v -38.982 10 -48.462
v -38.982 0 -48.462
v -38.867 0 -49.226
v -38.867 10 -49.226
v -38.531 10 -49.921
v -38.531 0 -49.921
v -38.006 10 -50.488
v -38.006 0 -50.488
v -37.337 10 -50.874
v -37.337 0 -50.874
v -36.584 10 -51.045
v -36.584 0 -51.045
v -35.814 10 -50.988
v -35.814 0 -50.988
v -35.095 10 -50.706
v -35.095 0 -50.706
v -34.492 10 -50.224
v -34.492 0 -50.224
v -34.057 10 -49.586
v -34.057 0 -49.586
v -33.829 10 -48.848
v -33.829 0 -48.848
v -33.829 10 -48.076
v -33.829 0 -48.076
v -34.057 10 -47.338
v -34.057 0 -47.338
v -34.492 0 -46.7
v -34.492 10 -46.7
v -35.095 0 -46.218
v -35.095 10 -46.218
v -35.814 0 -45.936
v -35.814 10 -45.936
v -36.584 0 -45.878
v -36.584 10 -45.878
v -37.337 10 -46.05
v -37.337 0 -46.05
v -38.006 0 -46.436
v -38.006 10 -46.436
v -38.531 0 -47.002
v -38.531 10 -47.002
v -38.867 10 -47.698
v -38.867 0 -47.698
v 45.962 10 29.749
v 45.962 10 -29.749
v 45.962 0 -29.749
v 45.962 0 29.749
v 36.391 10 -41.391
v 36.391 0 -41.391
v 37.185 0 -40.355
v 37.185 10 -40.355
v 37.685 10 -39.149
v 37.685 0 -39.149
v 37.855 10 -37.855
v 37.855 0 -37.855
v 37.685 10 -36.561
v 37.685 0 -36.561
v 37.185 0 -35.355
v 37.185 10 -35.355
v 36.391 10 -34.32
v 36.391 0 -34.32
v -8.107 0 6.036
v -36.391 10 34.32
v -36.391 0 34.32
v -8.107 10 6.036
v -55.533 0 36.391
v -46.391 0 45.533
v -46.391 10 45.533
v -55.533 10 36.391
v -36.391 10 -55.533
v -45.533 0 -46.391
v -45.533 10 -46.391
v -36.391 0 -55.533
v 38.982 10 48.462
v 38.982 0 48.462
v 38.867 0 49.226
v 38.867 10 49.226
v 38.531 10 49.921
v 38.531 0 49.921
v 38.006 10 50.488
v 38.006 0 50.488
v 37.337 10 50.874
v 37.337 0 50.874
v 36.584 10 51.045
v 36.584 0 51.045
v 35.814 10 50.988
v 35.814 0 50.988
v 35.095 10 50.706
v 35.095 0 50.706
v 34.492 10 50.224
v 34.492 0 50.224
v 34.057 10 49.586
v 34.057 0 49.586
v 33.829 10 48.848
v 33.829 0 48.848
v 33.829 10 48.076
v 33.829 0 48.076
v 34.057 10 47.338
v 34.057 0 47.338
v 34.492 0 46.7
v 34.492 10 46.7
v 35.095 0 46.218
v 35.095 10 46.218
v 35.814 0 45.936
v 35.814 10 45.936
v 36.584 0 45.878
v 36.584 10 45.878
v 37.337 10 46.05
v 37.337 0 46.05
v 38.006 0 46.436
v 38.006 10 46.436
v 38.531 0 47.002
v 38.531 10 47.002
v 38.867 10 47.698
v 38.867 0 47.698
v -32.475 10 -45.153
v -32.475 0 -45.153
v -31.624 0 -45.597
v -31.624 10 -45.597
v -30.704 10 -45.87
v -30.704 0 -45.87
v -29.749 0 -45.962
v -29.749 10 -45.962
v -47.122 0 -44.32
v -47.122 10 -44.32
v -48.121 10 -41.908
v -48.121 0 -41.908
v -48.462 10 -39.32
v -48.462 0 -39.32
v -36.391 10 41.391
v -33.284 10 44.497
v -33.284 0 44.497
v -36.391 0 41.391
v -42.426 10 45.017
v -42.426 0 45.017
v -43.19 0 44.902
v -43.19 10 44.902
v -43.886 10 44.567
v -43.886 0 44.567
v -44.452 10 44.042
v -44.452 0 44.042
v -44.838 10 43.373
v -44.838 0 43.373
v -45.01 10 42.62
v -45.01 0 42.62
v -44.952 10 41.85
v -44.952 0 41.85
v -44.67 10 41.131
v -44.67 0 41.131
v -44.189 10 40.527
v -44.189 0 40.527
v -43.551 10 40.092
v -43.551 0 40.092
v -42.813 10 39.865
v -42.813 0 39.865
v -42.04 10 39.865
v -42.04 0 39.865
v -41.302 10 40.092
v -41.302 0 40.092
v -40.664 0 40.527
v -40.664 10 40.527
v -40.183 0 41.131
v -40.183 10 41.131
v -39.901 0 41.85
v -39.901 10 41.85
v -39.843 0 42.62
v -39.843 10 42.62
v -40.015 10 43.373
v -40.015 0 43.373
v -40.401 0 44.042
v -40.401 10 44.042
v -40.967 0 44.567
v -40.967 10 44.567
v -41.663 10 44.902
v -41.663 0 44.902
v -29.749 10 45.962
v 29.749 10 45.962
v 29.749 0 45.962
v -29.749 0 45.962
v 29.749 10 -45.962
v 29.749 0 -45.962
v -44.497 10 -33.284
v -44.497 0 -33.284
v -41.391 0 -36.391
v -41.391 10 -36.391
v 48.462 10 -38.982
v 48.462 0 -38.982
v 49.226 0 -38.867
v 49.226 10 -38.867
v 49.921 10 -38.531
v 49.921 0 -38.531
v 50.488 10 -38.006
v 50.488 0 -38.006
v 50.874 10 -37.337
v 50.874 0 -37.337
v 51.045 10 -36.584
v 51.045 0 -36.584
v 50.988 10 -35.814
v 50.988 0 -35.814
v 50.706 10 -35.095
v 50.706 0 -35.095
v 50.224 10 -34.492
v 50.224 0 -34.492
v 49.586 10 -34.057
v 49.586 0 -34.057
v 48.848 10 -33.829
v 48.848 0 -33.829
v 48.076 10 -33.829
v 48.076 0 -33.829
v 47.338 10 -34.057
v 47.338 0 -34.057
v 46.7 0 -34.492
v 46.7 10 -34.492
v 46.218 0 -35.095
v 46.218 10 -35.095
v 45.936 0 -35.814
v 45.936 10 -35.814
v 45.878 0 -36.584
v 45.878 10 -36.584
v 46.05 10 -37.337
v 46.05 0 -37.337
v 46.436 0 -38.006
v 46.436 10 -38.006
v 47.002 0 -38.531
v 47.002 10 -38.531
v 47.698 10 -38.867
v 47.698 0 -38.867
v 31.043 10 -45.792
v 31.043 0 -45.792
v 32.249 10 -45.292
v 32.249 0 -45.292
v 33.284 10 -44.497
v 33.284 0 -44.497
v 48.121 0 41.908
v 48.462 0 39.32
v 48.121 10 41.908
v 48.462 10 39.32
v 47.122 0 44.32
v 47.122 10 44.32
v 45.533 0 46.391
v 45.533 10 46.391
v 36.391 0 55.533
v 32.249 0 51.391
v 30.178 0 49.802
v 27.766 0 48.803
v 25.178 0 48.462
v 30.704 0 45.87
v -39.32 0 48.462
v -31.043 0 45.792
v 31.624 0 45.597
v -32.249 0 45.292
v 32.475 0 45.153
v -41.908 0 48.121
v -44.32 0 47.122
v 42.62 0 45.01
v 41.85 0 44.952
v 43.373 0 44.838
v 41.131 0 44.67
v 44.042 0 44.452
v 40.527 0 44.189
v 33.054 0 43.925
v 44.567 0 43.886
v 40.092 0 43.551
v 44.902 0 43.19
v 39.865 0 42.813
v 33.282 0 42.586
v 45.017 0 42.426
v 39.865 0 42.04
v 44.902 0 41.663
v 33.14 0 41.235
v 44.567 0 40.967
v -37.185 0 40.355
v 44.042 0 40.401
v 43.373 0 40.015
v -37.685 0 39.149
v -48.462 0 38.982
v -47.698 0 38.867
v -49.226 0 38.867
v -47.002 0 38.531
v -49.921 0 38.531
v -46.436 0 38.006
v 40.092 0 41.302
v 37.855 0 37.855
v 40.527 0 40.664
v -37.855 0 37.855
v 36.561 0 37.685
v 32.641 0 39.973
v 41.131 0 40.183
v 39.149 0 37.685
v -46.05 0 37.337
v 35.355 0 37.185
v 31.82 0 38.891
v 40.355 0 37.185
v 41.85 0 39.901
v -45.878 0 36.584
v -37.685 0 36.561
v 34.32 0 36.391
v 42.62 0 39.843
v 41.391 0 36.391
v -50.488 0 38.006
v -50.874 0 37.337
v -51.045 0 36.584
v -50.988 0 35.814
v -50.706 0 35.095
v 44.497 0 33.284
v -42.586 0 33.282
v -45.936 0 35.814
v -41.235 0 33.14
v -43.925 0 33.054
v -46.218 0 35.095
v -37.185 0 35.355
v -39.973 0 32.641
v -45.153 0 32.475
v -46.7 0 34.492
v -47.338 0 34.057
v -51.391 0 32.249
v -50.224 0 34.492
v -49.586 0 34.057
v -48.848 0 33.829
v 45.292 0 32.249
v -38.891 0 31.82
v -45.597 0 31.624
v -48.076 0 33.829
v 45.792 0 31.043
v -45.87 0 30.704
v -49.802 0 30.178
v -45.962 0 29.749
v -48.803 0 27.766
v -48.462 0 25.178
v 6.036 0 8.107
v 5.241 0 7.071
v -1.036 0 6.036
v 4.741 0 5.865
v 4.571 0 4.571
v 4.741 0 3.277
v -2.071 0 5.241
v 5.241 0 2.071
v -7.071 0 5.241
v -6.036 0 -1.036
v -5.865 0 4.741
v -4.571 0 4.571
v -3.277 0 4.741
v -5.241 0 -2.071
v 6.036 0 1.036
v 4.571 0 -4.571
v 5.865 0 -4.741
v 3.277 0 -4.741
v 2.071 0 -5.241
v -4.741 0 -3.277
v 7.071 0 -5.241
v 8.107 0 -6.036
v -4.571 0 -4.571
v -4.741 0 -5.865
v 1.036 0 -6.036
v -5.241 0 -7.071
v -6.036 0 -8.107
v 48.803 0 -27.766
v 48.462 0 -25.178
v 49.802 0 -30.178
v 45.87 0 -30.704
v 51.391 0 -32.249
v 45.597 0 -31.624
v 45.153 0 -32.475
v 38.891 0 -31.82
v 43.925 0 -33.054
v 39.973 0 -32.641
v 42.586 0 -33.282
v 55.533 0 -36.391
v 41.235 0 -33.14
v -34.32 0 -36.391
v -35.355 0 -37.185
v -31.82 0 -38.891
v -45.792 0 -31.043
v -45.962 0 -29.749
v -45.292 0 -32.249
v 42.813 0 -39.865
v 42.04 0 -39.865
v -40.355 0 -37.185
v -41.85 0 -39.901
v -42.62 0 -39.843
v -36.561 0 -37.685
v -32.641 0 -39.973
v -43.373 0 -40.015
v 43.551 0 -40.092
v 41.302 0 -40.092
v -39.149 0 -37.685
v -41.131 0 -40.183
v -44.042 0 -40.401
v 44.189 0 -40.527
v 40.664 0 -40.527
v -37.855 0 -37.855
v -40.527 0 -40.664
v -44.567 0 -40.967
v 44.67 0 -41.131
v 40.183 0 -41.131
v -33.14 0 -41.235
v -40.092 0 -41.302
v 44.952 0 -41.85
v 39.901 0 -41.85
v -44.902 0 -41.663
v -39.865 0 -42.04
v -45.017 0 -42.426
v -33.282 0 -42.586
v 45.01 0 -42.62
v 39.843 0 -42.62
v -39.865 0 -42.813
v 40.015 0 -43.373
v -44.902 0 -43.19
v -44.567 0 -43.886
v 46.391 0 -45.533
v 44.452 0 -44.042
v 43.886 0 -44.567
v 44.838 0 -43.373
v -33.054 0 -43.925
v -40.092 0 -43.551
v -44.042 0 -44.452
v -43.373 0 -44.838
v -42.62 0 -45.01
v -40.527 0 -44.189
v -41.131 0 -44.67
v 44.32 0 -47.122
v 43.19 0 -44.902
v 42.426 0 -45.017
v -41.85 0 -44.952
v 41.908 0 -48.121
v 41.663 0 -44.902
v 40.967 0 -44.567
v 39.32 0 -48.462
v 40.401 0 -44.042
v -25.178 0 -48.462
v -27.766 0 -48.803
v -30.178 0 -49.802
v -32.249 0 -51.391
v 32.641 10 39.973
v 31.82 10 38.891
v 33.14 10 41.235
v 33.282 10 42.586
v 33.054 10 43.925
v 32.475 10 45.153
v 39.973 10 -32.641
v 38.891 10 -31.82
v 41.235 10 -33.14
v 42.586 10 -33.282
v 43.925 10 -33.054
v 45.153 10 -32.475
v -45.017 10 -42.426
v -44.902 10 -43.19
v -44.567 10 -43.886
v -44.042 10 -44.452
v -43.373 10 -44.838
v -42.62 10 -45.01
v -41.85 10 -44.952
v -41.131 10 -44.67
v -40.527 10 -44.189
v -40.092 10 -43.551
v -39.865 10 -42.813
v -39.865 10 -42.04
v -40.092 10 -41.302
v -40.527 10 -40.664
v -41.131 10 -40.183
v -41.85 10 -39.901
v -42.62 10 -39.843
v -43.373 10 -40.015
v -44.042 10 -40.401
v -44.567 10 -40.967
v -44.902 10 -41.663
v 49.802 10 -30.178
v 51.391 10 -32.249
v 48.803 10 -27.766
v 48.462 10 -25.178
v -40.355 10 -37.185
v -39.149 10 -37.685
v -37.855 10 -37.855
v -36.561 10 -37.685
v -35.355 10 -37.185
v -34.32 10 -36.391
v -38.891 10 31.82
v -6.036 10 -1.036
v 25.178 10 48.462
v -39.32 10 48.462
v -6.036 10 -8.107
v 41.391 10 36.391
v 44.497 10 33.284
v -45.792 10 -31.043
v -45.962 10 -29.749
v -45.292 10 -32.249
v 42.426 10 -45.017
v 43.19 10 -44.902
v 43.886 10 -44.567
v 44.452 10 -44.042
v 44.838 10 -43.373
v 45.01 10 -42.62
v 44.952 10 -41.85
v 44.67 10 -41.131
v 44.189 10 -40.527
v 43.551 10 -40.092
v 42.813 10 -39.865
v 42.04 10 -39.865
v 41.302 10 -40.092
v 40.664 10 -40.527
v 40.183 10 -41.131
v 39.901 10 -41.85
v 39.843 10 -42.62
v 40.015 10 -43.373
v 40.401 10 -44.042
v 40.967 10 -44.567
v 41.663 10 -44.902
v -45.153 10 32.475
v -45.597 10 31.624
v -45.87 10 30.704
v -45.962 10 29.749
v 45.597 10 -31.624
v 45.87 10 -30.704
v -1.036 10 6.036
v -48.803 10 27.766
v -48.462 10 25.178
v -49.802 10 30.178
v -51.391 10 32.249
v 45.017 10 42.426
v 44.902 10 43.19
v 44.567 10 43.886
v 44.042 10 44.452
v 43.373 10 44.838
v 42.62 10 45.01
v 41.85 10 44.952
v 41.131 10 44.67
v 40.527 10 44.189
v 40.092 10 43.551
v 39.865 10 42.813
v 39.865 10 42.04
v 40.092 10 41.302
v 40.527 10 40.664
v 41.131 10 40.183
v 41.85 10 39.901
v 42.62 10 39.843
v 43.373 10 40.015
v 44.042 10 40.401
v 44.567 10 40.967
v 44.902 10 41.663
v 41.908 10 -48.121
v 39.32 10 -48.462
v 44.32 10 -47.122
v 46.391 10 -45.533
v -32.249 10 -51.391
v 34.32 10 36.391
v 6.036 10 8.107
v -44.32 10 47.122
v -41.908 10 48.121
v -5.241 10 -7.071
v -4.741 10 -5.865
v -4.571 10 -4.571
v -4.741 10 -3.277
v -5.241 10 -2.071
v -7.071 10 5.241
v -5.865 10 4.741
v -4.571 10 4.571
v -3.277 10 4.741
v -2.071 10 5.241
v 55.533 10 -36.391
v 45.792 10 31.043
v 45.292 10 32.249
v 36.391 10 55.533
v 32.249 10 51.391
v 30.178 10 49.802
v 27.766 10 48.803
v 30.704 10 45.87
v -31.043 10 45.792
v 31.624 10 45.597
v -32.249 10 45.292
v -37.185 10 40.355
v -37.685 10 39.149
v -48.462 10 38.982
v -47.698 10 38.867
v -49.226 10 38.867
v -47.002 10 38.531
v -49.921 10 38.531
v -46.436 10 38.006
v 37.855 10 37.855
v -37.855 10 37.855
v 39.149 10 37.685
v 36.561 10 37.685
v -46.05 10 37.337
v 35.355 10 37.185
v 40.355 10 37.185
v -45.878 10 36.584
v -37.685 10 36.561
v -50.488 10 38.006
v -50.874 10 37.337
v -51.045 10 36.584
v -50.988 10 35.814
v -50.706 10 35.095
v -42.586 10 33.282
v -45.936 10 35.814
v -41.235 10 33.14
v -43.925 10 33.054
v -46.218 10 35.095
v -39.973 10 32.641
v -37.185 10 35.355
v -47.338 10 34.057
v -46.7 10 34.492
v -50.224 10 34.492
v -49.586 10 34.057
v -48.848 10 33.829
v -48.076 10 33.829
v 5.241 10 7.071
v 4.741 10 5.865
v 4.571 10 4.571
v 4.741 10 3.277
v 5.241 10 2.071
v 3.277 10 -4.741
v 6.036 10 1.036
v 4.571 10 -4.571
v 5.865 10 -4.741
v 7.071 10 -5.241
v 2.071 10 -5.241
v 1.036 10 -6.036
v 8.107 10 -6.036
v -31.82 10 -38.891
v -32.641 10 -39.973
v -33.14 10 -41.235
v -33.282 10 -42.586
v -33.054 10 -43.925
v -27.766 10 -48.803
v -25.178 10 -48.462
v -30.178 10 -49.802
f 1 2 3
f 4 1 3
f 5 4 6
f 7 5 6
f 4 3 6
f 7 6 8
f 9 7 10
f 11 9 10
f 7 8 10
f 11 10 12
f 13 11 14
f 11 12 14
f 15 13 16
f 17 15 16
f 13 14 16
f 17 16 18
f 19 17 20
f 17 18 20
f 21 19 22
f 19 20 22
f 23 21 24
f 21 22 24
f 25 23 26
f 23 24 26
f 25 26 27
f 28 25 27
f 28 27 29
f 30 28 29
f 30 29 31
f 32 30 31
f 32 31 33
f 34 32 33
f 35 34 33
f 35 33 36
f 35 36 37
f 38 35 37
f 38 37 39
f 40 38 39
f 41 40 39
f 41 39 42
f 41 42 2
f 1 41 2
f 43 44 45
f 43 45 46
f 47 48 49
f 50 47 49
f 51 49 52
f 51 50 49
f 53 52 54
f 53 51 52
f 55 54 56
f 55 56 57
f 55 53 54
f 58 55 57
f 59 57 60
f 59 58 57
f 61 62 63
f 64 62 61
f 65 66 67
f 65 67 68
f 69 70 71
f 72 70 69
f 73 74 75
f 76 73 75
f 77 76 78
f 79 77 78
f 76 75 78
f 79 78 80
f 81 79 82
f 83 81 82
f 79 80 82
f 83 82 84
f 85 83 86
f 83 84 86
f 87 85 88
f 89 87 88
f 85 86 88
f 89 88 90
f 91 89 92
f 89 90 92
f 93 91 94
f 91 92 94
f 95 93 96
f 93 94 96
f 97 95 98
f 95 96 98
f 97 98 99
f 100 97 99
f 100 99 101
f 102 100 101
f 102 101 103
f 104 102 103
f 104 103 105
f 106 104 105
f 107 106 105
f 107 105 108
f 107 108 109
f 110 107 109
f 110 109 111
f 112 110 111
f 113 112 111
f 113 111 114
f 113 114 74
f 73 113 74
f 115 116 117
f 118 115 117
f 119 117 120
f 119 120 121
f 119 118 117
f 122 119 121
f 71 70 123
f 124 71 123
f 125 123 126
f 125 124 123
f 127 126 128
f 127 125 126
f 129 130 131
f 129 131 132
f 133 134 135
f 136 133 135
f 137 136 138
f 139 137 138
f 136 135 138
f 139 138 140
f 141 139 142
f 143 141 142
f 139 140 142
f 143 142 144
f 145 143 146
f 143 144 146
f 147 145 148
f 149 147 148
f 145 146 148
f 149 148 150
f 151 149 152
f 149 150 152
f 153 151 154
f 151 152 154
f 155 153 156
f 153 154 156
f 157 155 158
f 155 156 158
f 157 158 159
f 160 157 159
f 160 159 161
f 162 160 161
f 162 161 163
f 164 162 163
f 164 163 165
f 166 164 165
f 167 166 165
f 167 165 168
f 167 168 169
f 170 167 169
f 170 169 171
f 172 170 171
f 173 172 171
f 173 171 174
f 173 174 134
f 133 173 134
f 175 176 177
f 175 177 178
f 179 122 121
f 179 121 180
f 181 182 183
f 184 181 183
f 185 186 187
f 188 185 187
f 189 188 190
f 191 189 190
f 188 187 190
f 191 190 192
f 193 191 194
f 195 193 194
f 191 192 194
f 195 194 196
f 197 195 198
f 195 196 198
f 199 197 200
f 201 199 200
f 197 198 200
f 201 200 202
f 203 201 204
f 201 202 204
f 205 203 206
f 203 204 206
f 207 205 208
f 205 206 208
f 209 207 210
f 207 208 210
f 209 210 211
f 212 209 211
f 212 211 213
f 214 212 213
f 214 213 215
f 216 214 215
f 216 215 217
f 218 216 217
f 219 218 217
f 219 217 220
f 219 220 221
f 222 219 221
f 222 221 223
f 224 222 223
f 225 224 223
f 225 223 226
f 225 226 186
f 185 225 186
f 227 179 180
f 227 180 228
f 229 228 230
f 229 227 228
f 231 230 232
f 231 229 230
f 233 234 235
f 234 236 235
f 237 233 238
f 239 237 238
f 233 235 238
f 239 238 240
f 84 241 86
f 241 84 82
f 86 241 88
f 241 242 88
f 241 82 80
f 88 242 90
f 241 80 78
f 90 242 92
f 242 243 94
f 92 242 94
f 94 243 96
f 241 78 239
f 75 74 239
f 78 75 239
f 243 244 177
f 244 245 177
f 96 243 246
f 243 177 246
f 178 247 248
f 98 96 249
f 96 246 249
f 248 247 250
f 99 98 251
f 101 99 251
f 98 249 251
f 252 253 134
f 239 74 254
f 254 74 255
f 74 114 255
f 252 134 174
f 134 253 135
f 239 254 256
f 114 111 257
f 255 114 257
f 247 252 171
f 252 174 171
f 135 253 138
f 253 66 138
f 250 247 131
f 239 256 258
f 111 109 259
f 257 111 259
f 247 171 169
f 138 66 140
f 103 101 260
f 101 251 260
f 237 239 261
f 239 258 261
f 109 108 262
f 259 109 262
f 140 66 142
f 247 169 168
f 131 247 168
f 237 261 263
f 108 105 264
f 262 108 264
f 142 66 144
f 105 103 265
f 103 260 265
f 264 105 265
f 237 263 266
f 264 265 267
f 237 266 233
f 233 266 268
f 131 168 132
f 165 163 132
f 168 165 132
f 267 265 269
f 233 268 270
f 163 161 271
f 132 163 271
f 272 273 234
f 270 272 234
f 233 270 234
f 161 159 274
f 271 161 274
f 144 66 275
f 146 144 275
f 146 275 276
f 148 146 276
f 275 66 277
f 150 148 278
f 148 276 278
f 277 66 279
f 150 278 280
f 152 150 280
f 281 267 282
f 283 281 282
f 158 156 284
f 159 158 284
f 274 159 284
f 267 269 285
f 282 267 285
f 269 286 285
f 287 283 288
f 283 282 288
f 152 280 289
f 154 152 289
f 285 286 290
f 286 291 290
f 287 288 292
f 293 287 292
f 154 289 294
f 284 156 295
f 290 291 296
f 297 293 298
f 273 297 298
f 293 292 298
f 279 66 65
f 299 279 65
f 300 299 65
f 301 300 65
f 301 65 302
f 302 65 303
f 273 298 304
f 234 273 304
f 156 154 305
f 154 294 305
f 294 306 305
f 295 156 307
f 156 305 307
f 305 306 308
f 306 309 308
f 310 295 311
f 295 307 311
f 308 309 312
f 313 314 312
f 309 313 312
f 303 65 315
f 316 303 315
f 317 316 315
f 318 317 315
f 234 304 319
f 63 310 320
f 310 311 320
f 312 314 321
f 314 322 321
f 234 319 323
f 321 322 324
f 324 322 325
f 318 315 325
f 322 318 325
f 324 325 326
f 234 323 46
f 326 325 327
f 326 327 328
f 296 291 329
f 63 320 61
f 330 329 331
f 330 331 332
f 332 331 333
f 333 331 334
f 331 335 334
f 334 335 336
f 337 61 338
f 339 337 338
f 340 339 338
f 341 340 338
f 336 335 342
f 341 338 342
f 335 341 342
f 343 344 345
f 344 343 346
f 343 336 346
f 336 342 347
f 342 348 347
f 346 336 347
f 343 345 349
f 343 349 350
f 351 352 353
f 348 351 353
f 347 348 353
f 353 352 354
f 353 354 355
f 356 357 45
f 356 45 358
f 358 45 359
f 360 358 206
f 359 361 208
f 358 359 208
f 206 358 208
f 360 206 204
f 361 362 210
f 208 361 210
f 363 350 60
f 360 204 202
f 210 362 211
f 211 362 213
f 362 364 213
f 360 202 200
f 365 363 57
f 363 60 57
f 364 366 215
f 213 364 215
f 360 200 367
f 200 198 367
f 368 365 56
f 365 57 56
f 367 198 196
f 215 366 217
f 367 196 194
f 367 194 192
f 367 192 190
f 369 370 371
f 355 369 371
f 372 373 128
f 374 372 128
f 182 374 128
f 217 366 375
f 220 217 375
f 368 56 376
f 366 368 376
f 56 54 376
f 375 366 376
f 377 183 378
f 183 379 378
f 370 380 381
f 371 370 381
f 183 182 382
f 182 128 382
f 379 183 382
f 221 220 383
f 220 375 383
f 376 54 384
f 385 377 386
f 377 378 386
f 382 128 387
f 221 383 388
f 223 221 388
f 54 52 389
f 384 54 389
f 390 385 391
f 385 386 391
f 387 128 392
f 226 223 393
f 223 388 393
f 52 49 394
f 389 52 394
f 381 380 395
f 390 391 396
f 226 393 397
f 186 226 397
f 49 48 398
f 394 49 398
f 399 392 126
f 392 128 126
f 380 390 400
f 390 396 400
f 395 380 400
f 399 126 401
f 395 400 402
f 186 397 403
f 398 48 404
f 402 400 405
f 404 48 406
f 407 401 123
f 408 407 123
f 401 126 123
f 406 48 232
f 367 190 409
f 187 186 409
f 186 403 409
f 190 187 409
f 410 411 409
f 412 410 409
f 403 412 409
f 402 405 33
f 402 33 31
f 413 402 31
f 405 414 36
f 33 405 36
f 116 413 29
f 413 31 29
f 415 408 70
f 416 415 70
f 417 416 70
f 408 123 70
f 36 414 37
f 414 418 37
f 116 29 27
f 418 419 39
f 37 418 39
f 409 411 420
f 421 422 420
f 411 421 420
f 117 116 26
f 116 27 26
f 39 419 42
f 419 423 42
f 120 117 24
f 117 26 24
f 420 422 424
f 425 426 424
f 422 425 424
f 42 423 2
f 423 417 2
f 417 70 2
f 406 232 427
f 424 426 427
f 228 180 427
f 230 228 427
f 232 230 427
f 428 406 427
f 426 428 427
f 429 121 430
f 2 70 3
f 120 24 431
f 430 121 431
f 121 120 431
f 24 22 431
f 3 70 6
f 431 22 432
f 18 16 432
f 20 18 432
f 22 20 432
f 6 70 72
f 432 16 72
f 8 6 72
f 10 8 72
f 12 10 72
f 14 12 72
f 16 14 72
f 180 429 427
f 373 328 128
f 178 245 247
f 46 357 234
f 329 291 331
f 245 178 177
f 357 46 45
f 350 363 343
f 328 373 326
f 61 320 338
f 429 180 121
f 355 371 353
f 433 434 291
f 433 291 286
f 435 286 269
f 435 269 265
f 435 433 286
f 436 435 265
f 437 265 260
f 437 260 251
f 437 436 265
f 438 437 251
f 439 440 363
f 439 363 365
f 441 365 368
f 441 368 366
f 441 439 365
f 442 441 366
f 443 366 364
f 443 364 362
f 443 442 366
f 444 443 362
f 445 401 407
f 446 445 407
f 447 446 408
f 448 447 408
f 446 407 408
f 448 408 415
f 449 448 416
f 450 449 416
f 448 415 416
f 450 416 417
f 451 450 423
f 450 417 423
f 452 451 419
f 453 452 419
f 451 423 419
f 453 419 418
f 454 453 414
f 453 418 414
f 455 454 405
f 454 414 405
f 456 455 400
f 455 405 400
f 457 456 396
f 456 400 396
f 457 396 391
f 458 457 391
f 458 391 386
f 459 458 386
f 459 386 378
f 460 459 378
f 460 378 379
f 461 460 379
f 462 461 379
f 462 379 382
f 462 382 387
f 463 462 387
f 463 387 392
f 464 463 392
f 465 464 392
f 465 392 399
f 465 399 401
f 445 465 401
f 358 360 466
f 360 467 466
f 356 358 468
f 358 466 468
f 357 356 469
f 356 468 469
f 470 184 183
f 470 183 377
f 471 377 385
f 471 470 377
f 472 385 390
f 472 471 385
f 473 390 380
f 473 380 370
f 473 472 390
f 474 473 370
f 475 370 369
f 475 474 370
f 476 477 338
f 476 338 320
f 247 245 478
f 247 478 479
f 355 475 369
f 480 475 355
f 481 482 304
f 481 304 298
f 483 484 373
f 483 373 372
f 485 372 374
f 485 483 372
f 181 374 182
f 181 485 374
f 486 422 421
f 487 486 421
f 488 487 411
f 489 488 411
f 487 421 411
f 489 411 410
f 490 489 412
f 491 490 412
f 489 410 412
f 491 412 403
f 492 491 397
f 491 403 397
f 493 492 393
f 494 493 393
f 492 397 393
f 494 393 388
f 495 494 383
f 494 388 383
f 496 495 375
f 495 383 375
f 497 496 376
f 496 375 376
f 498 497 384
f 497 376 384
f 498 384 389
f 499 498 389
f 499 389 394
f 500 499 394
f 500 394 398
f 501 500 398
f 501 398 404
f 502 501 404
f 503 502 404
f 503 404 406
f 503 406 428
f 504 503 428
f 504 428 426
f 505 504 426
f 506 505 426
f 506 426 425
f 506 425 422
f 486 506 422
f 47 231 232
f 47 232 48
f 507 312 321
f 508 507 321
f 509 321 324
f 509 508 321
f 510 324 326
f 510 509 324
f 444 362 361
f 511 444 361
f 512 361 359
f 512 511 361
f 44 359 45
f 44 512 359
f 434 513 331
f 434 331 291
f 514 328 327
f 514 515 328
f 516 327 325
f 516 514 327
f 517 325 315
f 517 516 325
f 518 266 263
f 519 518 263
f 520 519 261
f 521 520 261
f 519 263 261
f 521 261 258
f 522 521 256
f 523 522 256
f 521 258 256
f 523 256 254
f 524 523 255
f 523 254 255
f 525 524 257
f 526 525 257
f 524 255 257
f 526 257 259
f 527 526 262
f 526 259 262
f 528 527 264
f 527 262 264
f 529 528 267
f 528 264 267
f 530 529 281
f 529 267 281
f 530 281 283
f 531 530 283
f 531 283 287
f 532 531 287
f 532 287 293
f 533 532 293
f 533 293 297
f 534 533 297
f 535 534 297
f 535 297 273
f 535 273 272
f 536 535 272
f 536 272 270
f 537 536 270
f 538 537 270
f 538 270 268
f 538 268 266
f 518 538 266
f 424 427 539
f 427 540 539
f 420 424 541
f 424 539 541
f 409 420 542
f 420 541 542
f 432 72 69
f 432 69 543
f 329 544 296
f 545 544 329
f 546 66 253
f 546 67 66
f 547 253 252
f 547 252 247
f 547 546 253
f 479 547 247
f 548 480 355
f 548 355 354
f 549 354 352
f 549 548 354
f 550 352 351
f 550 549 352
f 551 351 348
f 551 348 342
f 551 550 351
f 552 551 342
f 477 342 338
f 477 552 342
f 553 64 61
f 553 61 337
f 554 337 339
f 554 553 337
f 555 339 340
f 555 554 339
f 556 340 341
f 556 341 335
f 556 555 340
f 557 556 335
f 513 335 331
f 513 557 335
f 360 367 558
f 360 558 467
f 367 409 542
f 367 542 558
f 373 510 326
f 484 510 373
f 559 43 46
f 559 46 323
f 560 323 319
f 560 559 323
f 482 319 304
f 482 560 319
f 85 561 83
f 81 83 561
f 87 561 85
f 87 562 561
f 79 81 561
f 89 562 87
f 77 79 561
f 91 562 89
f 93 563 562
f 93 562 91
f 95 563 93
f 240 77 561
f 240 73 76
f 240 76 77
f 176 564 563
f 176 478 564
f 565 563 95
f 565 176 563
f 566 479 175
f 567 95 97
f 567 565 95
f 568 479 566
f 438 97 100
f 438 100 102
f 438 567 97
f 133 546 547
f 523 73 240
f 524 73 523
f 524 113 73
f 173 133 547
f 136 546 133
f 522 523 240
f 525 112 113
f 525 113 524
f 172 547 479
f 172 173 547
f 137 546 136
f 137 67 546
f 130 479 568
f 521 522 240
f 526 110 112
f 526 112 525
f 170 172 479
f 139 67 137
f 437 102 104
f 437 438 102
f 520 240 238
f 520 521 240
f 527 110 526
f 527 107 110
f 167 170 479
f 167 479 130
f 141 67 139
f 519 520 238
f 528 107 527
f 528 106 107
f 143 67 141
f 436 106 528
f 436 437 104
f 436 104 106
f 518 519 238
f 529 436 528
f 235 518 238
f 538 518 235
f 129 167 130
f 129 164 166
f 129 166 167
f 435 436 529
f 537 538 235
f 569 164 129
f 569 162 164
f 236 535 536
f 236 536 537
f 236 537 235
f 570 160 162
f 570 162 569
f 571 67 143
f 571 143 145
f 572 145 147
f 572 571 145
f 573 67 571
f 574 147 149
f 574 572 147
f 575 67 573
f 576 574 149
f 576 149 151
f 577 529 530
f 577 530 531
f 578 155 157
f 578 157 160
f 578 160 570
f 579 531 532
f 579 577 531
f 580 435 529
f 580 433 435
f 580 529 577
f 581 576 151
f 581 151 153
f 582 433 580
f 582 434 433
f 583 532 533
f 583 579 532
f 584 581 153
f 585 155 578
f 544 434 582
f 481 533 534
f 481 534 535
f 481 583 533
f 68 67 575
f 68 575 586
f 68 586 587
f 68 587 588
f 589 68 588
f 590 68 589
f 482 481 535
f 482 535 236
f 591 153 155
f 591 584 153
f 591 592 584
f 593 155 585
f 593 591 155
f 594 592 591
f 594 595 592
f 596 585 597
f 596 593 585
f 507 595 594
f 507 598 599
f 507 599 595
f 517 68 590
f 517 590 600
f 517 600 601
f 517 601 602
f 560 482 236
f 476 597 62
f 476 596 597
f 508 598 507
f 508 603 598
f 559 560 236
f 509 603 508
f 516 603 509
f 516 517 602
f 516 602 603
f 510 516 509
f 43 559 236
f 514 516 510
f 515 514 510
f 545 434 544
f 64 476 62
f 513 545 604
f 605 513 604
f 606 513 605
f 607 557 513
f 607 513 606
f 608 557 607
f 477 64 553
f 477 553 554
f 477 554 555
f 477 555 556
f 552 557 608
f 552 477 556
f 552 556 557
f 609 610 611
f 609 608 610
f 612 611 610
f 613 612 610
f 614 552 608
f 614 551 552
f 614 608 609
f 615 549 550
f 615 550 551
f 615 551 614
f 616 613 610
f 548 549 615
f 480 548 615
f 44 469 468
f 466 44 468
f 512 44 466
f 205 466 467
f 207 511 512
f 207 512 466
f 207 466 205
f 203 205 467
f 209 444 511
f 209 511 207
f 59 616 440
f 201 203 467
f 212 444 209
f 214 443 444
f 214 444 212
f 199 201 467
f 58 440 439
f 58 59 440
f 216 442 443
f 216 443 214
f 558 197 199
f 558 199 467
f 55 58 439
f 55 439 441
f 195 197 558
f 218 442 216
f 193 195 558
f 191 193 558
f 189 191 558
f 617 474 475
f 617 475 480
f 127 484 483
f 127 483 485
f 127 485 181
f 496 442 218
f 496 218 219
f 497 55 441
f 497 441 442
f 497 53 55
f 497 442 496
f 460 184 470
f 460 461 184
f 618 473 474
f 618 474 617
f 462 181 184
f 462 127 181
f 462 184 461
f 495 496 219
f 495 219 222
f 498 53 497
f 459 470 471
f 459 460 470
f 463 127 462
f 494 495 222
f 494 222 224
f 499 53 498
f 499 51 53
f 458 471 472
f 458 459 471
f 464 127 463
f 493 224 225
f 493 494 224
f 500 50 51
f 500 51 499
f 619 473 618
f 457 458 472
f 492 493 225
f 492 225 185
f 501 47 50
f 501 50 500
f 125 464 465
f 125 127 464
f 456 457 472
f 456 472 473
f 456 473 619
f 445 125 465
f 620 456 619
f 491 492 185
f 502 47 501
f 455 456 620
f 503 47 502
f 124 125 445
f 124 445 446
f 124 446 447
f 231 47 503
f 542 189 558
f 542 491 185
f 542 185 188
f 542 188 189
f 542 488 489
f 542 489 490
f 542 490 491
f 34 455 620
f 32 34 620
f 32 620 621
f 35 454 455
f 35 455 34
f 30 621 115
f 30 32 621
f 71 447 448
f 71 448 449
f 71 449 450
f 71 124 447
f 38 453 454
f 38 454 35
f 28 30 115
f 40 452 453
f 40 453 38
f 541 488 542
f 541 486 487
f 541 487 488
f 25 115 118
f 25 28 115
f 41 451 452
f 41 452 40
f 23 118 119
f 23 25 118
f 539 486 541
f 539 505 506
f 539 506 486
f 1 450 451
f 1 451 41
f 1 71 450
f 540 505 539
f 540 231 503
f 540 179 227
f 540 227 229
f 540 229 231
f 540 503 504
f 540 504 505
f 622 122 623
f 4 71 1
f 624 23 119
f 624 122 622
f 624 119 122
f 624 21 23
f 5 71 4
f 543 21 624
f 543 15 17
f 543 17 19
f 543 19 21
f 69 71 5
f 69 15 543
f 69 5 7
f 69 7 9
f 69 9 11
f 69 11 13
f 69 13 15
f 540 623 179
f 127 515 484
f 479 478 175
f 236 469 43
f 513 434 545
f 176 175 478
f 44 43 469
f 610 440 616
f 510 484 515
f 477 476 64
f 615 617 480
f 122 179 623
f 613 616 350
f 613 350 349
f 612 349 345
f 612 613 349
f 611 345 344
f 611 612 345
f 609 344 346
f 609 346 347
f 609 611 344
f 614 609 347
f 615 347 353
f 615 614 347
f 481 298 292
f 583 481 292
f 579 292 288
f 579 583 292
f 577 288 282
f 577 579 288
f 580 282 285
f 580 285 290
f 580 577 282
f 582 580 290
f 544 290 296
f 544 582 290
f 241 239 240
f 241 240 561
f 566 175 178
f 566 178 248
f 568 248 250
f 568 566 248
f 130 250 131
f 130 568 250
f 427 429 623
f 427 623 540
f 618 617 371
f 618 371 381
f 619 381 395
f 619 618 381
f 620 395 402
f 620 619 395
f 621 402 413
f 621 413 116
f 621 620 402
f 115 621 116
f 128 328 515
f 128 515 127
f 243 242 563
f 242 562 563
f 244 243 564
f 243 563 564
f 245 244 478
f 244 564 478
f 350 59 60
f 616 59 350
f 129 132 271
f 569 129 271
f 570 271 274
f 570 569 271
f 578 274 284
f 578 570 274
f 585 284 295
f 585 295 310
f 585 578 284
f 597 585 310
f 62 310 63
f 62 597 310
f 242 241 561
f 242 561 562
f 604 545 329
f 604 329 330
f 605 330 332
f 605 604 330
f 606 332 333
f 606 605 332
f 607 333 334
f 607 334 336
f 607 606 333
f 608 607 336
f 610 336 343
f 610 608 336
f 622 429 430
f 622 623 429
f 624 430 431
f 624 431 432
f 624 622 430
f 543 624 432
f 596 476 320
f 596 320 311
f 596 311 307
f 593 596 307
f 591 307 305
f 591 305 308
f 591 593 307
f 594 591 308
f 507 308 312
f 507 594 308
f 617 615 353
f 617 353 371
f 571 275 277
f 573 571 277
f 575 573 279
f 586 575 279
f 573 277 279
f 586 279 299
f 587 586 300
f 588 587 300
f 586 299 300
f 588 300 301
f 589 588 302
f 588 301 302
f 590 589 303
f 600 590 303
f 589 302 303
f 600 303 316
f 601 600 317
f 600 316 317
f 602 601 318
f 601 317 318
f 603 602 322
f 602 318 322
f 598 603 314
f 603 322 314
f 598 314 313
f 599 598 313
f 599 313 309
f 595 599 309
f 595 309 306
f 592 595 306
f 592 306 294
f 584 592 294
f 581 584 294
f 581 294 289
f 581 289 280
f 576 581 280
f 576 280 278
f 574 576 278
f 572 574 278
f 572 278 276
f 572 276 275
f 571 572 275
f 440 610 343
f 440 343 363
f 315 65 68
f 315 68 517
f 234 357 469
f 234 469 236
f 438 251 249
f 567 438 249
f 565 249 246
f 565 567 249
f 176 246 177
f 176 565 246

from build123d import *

# Parameters (mm, degrees)
BOSS_EXTRUDE1_DEPTH        = 10
CUT_EXTRUDE1_DEPTH         = 80.169628557
FILLET4_R                  = 5
CIRPATTERN6_COUNT          = 4
FILLET4_OF_CIRPATTERN6_R   = 5
FILLET5_R                  = 10
F_6_0_204_DIAMETER_HOLE1_D = 5.1816
CIRPATTERN7_COUNT          = 4


with BuildPart() as part:
    # Sketch1 → Boss-Extrude1 (new body)
    with BuildSketch(Plane(origin=(0, 0, 0), x_dir=(1, 0, 0), z_dir=(0, 1, 0))):
        Polygon((-48.461940777, 43.461940777), (-36.390872965, 55.533008589), (-29.319805153, 48.461940777), (43.461940777, 48.461940777), (55.533008589, 36.390872965), (48.461940777, 29.319805153), (48.461940777, -43.461940777), (36.390872965, -55.533008589), (29.319805153, -48.461940777), (-43.461940777, -48.461940777), (-55.533008589, -36.390872965), (-48.461940777, -29.319805153), align=None)
    extrude(amount=BOSS_EXTRUDE1_DEPTH)

    # Sketch2 → Cut-Extrude1 (cut, through all)
    with BuildSketch(Plane(origin=(0, 10, 0), x_dir=(1, 0, 0), z_dir=(0, 1, 0))):
        Polygon((-2.5, 4.571067812), (-42.426406871, -35.355339059), (-45.961940777, -31.819805153), (-45.961940777, 31.819805153), (-37.855339059, 39.926406871), align=None)
    cut_extrude1 = extrude(amount=-CUT_EXTRUDE1_DEPTH, mode=Mode.SUBTRACT)

    # Fillet4
    # the kernel refuses this fillet: 5 mm, written as the material it adds along each edge
    with BuildSketch(Plane(origin=(-37.855339059, 10, -39.926406871), x_dir=(-0.7071067811865468, 0, 0.7071067811865482), z_dir=(0, -1, 0)), Plane(origin=(-2.5, 10, -4.571067812), x_dir=(-0.7071067811865471, 0, -0.707106781186548), z_dir=(0, -1, 0))) as fillet4_piece_1:
        with BuildLine():
            CenterArc((FILLET4_R, -FILLET4_R), FILLET4_R, 90, 90)
            Line((0, -FILLET4_R), (0, 0))
            Line((0, 0), (FILLET4_R, 0))
        make_face()
    extrude(amount=10)
    with BuildSketch(Plane(origin=(-45.961940777, 10, 31.819805153), x_dir=(0.7071067811865467, 0, 0.7071067811865483), z_dir=(0, -1, 0)), Plane(origin=(-45.961940777, 10, -31.819805153), x_dir=(0, 0, 1), z_dir=(0, -1, 0))) as fillet4_piece_2:
        with BuildLine():
            CenterArc((FILLET4_R * 0.414213562373, -FILLET4_R), FILLET4_R, 90, 45)
            Line((-FILLET4_R * 0.292893218813, -FILLET4_R * 0.292893218813), (0, 0))
            Line((0, 0), (FILLET4_R * 0.414213562373, 0))
        make_face()
    extrude(amount=10)
    with BuildSketch(Plane(origin=(-42.426406871, 10, 35.355339059), x_dir=(-0.707106781186546, 0, -0.7071067811865489), z_dir=(0, -1, 0))) as fillet4_piece_3:
        with BuildLine():
            CenterArc((FILLET4_R, FILLET4_R), FILLET4_R, 180, 90)
            Line((0, FILLET4_R), (0, 0))
            Line((0, 0), (FILLET4_R, 0))
        make_face()
    extrude(amount=10)

    # CirPattern6: Cut-Extrude1 ×4 about axis
    cirpattern6_axis = Axis((0, 0, 0), (0, 1, 0))
    for i in range(1, CIRPATTERN6_COUNT):
        add(cut_extrude1.rotate(cirpattern6_axis, i * 360 / CIRPATTERN6_COUNT), mode=Mode.SUBTRACT)

    # Fillet4 of CirPattern6
    # the kernel refuses this fillet: 5 mm, written as the material it adds along each edge
    with BuildSketch(Plane(origin=(-39.926406871, 10, 37.855339059), x_dir=(0.7071067811865476, 0, -0.7071067811865476), z_dir=(0, -1, 0)), Plane(origin=(37.855339059, 10, 39.926406871), x_dir=(-0.7071067811865475, 0, -0.7071067811865475), z_dir=(0, -1, 0)), Plane(origin=(39.926406871, 10, -37.855339059), x_dir=(-0.7071067811865476, 0, 0.7071067811865476), z_dir=(0, -1, 0)), Plane(origin=(-35.355339059, 10, -42.426406871), x_dir=(0.7071067811865486, 0, -0.7071067811865465), z_dir=(0, -1, 0))) as fillet4_of_cirpattern6_piece_1:
        with BuildLine():
            CenterArc((FILLET4_OF_CIRPATTERN6_R, FILLET4_OF_CIRPATTERN6_R), FILLET4_OF_CIRPATTERN6_R, 180, 90)
            Line((0, FILLET4_OF_CIRPATTERN6_R), (0, 0))
            Line((0, 0), (FILLET4_OF_CIRPATTERN6_R, 0))
        make_face()
    extrude(amount=10)
    with BuildSketch(Plane(origin=(-4.571067812, 10, 2.5), x_dir=(-0.707106781186548, 0, 0.7071067811865469), z_dir=(0, -1, 0)), Plane(origin=(35.355339059, 10, 42.426406871), x_dir=(-0.7071067811865479, 0, -0.7071067811865471), z_dir=(0, -1, 0)), Plane(origin=(2.5, 10, 4.571067812), x_dir=(0.7071067811865474, 0, 0.7071067811865478), z_dir=(0, -1, 0)), Plane(origin=(42.426406871, 10, -35.355339059), x_dir=(-0.7071067811865471, 0, 0.7071067811865479), z_dir=(0, -1, 0)), Plane(origin=(4.571067812, 10, -2.5), x_dir=(0.7071067811865478, 0, -0.7071067811865472), z_dir=(0, -1, 0))) as fillet4_of_cirpattern6_piece_2:
        with BuildLine():
            CenterArc((FILLET4_OF_CIRPATTERN6_R, -FILLET4_OF_CIRPATTERN6_R), FILLET4_OF_CIRPATTERN6_R, 90, 90)
            Line((0, -FILLET4_OF_CIRPATTERN6_R), (0, 0))
            Line((0, 0), (FILLET4_OF_CIRPATTERN6_R, 0))
        make_face()
    extrude(amount=10)
    with BuildSketch(Plane(origin=(31.819805153, 10, 45.961940777), x_dir=(-1, 0, 0), z_dir=(0, -1, 0)), Plane(origin=(-31.819805153, 10, 45.961940777), x_dir=(-0.7071067811865483, 0, -0.7071067811865467), z_dir=(0, -1, 0)), Plane(origin=(45.961940777, 10, -31.819805153), x_dir=(0, 0, 1), z_dir=(0, -1, 0)), Plane(origin=(45.961940777, 10, 31.819805153), x_dir=(-0.7071067811865458, 0, 0.7071067811865492), z_dir=(0, -1, 0)), Plane(origin=(-31.819805153, 10, -45.961940777), x_dir=(1, 0, 0), z_dir=(0, -1, 0)), Plane(origin=(31.819805153, 10, -45.961940777), x_dir=(0.7071067811865492, 0, 0.7071067811865458), z_dir=(0, -1, 0))) as fillet4_of_cirpattern6_piece_3:
        with BuildLine():
            CenterArc((FILLET4_OF_CIRPATTERN6_R * 0.414213562373, FILLET4_OF_CIRPATTERN6_R), FILLET4_OF_CIRPATTERN6_R, 225, 45)
            Line((-FILLET4_OF_CIRPATTERN6_R * 0.292893218813, FILLET4_OF_CIRPATTERN6_R * 0.292893218813), (0, 0))
            Line((0, 0), (FILLET4_OF_CIRPATTERN6_R * 0.414213562373, 0))
        make_face()
    extrude(amount=10)

    # Fillet5
    fillet5_edges = [part.edges().sort_by_distance(p)[0] for p in [
        (-48.461940777, 5, -43.461940777),
        (-29.319805153, 5, -48.461940777),
        (43.461940777, 5, -48.461940777),
        (48.461940777, 5, -29.319805153),
        (48.461940777, 5, 43.461940777),
        (29.319805153, 5, 48.461940777),
        (-43.461940777, 5, 48.461940777),
        (-48.461940777, 5, 29.319805153),
    ]]
    fillet(fillet5_edges, radius=FILLET5_R)

    # #6 (0.204) Diameter Hole1 (through all)
    with Locations(Plane(origin=(0, 10, 0), x_dir=(1, 0, 0), z_dir=(0, 1, 0))):
        with Locations((-42.426406871, 42.426406871), (-36.390872965, 48.461940777)):
            f_6_0_204_diameter_hole1 = Hole(F_6_0_204_DIAMETER_HOLE1_D / 2)

    # CirPattern7: #6 (0.204) Diameter Hole1 ×4 about axis
    cirpattern7_axis = Axis((0, 0, 0), (0, 1, 0))
    for i in range(1, CIRPATTERN7_COUNT):
        add(f_6_0_204_diameter_hole1.rotate(cirpattern7_axis, i * 360 / CIRPATTERN7_COUNT), mode=Mode.SUBTRACT)


solid = part.part
